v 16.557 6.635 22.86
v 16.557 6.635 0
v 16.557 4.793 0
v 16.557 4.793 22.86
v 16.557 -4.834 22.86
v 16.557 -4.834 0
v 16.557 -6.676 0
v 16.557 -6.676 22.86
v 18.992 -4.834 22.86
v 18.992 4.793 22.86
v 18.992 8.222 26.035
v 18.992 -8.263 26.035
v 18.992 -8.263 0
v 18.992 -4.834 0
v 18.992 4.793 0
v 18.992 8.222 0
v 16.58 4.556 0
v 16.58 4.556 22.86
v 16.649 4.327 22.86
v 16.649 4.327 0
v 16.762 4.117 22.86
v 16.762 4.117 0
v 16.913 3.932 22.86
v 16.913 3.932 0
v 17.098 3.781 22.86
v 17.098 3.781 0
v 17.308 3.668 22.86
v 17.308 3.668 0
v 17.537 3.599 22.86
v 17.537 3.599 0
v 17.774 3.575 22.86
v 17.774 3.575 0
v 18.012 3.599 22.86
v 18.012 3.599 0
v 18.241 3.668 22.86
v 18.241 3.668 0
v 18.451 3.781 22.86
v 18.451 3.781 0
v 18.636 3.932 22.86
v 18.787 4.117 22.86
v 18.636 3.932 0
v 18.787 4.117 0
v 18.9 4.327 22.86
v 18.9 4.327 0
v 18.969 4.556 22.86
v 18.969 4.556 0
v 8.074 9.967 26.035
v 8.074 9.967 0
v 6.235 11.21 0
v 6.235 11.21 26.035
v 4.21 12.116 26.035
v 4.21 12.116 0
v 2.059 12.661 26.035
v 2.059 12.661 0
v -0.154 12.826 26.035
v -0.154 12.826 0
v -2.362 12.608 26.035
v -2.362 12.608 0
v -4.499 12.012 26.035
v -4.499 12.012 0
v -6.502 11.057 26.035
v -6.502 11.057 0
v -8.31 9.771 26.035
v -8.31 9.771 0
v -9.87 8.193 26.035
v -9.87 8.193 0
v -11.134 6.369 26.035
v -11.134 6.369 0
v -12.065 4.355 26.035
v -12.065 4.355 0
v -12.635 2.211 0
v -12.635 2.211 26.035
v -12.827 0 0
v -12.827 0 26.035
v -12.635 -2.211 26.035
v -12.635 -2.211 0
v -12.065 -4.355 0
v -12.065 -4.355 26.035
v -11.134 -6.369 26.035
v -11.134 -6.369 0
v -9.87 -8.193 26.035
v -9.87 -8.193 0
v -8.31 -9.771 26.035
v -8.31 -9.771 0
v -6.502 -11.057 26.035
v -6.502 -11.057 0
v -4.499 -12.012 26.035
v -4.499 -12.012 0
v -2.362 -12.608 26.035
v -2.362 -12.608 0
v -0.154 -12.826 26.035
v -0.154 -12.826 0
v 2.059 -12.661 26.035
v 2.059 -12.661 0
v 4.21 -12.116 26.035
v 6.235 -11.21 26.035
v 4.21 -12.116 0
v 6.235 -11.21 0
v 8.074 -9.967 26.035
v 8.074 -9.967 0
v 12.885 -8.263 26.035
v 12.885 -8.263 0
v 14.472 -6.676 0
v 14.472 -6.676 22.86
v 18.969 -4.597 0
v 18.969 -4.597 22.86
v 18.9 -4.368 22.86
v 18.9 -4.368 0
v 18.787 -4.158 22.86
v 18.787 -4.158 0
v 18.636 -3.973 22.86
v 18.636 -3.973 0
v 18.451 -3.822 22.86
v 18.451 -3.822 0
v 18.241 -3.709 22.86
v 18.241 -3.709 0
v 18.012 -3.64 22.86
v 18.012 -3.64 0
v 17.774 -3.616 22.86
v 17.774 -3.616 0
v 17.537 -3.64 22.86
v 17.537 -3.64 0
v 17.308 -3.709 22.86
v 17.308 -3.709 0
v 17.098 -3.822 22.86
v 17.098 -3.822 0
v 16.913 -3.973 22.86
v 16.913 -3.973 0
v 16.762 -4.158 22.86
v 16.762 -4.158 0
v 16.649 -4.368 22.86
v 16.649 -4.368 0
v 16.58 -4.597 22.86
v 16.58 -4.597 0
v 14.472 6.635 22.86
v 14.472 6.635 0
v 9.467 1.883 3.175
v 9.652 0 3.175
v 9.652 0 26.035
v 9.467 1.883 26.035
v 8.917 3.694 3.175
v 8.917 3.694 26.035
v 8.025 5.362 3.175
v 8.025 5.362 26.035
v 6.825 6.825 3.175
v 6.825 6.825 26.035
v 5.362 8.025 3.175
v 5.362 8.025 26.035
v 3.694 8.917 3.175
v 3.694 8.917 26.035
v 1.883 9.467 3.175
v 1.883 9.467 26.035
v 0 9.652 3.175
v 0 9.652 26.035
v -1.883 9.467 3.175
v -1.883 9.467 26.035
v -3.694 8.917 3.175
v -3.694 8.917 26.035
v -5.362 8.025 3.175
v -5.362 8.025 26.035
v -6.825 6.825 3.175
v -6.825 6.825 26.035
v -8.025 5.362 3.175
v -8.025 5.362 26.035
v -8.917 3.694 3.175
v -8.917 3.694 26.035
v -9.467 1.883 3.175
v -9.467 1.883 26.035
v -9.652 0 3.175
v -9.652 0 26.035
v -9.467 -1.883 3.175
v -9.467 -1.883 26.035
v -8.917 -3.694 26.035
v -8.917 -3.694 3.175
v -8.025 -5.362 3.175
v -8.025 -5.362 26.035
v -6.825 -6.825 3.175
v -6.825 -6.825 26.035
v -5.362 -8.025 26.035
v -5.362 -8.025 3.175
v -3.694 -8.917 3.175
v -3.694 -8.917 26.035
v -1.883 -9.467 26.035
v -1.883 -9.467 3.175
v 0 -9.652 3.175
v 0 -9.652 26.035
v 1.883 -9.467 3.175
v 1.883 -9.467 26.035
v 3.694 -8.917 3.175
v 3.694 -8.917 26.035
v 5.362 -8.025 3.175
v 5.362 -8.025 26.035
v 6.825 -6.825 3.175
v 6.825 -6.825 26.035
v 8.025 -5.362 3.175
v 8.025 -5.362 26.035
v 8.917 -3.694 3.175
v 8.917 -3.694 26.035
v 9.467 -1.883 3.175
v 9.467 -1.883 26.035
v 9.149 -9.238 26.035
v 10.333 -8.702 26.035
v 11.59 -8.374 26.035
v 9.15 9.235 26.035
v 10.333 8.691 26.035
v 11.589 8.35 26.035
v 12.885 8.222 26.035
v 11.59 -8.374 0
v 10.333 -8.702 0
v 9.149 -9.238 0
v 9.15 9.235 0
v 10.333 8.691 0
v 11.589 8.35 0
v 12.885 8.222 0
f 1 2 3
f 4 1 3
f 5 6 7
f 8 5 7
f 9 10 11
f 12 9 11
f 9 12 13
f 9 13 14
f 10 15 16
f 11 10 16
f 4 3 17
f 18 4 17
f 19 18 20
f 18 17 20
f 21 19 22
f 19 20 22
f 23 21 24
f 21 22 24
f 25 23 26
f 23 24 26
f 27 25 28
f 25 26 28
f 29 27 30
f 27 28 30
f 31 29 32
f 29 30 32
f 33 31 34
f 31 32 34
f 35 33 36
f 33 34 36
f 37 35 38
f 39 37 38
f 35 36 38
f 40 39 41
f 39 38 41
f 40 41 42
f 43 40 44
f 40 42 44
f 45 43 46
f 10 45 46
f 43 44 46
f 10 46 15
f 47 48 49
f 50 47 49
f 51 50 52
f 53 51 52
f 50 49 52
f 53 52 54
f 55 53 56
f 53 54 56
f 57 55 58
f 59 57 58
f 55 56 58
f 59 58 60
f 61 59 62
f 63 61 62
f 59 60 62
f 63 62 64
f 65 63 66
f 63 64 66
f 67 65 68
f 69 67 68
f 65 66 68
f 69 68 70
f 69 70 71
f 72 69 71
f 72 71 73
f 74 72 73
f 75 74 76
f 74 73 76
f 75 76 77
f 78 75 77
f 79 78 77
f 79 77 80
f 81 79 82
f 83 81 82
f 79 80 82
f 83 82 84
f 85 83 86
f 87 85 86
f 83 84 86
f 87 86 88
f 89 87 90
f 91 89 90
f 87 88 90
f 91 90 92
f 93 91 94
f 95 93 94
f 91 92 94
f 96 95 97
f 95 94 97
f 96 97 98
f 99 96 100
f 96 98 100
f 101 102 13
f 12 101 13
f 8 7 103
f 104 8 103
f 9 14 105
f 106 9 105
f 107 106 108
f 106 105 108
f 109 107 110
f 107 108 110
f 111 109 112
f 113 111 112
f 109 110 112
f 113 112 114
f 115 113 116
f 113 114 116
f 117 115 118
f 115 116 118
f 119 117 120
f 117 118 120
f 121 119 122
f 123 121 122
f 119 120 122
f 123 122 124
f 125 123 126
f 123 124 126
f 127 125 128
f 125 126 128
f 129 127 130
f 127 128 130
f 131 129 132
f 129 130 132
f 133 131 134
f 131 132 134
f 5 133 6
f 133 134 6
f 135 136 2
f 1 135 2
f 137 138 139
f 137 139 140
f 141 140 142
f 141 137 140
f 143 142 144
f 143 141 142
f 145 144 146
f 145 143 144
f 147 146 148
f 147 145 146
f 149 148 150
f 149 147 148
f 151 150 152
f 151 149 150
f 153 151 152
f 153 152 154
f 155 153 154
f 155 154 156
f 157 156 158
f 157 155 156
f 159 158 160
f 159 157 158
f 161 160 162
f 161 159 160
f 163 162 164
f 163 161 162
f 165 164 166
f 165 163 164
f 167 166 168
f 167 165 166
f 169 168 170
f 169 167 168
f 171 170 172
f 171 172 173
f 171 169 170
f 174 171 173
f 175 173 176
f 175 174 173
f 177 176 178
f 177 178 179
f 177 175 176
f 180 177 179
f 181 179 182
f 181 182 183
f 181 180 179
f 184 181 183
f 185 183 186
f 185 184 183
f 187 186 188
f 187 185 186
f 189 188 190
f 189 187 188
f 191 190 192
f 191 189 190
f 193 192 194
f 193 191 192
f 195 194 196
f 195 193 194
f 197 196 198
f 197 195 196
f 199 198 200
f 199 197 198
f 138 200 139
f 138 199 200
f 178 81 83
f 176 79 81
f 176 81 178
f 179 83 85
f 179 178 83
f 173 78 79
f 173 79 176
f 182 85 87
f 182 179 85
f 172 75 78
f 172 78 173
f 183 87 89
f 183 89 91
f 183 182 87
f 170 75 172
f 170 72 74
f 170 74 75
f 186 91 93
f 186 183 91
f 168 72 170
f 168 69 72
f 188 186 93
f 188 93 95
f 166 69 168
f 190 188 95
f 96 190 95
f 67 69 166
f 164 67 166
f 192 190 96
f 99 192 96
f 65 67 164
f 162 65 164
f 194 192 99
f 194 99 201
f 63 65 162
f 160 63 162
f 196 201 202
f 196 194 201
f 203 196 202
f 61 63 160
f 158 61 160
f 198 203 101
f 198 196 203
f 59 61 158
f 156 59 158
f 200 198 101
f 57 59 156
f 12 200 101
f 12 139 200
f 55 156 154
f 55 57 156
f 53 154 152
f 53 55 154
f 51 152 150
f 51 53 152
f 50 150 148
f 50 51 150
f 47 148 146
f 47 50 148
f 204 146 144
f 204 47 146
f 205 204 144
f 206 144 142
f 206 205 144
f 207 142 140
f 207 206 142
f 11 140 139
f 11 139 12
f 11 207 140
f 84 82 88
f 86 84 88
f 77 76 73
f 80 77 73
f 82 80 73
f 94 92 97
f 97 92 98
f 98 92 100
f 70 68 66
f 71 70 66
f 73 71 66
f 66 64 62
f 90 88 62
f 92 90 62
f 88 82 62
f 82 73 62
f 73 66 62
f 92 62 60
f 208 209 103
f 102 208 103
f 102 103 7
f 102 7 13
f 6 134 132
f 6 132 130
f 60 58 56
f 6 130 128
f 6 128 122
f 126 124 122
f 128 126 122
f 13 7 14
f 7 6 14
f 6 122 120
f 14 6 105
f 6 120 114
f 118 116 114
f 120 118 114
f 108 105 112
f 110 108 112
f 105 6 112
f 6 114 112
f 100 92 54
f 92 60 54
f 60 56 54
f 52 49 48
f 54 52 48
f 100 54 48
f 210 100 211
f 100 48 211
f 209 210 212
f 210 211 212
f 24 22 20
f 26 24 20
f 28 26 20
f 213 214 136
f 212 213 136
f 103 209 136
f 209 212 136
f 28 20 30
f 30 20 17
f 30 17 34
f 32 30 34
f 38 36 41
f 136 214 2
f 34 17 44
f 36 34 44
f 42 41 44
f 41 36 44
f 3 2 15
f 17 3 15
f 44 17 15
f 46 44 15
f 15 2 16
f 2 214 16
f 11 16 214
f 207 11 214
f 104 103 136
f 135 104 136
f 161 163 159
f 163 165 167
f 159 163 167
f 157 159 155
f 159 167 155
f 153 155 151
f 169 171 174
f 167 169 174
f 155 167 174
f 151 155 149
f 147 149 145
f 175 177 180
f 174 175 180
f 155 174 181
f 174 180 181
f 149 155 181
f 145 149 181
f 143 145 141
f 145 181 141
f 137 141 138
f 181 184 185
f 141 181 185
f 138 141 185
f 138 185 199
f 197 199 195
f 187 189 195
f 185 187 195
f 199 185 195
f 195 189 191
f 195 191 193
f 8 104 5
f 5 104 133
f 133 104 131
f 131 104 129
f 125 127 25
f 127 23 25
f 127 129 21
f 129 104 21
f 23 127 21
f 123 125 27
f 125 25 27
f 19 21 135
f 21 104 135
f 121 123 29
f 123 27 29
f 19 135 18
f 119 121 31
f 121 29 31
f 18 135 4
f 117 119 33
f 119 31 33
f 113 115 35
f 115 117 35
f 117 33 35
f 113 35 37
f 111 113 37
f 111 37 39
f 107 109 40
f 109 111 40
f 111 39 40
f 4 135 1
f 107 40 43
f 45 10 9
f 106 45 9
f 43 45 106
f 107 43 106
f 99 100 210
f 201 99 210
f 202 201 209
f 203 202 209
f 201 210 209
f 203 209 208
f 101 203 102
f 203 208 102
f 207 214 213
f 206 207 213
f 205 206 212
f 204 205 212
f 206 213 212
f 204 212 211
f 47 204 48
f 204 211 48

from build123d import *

# Parameters (mm, degrees)
F0_R     = 9.652
F1_DEPTH = 22.86
F2_R     = 9.652
F3_DEPTH = 3.175
F4_R     = 9.652
F5_DEPTH = 3.175


with BuildPart() as f1:
    # F0 (on Top) → F1 (new body)
    with BuildSketch(Plane.XY):
        with BuildLine():
            Line((14.4724995292, -6.4216016291), (14.4724995292, 6.2783983709))
            Line((14.4724995292, 6.2783983709), (14.4724995292, 6.6347159585))
            Line((14.4724995292, 6.6347159585), (14.5994995292, 6.6347159585))
            Line((14.5994995292, 6.6347159585), (16.1869995292, 6.6347159585))
            Line((16.1869995292, 6.6347159585), (16.5567258399, 6.6347159585))
            Line((16.5567258399, 6.6347159585), (16.5567258399, 4.7932159585))
            ThreePointArc((16.5567258399, 4.7932159585), (17.7744995292, 3.5754422692), (18.9922732184, 4.7932159585))
            Line((18.9922732184, 4.7932159585), (18.9922732184, 6.6347159585))
            Line((18.9922732184, 6.6347159585), (18.9922732184, 8.2222159585))
            Line((18.9922732184, 8.2222159585), (14.4724995292, 8.2222159585))
            Line((14.4724995292, 8.2222159585), (12.8849995292, 8.2222159585))
            ThreePointArc((12.8849995292, 8.2222159585), (10.3328098948, 8.6905993264), (8.0737784074, 9.9672479265))
            ThreePointArc((8.0737784074, 9.9672479265), (-12.827, 0), (8.0737784074, -9.9672479265))
            ThreePointArc((8.0737784074, -9.9672479265), (10.3329433344, -8.7017229937), (12.8849995292, -8.2631016291))
            Line((12.8849995292, -8.2631016291), (14.4724995292, -8.2631016291))
            Line((14.4724995292, -8.2631016291), (18.9922732184, -8.2631016291))
            Line((18.9922732184, -8.2631016291), (18.9922732184, -6.6756016291))
            Line((18.9922732184, -6.6756016291), (18.9922732184, -4.8341016291))
            ThreePointArc((18.9922732184, -4.8341016291), (17.7744995292, -3.6163279398), (16.5567258399, -4.8341016291))
            Line((16.5567258399, -4.8341016291), (16.5567258399, -6.6756016291))
            Line((16.5567258399, -6.6756016291), (16.1869995292, -6.6756016291))
            Line((16.1869995292, -6.6756016291), (14.4724995292, -6.6756016291))
            Line((14.4724995292, -6.6756016291), (14.4724995292, -6.4216016291))
        make_face()
        Circle(F0_R, mode=Mode.SUBTRACT)
    extrude(amount=F1_DEPTH)

    # F2 (on face) → F3 (join)
    with BuildSketch(Plane.XY.offset(22.86)):
        with BuildLine():
            ThreePointArc((12.8849995292, 8.2222159585), (10.3328098948, 8.6905993264), (8.0737784074, 9.9672479265))
            ThreePointArc((8.0737784074, 9.9672479265), (-12.827, 0), (8.0737784074, -9.9672479265))
            ThreePointArc((8.0737784074, -9.9672479265), (10.3329433344, -8.7017229937), (12.8849995292, -8.2631016291))
            Line((12.8849995292, -8.2631016291), (18.9922732184, -8.2631016291))
            Line((18.9922732184, -8.2631016291), (18.9922732184, -4.8341016291))
            ThreePointArc((18.9922732184, -4.8341016291), (17.7744995292, -3.6163279398), (16.5567258399, -4.8341016291))
            Line((16.5567258399, -4.8341016291), (16.5567258399, -6.6756016291))
            Line((16.5567258399, -6.6756016291), (14.4724995292, -6.6756016291))
            Line((14.4724995292, -6.6756016291), (14.4724995292, 6.6347159585))
            Line((14.4724995292, 6.6347159585), (16.5567258399, 6.6347159585))
            Line((16.5567258399, 6.6347159585), (16.5567258399, 4.7932159585))
            ThreePointArc((16.5567258399, 4.7932159585), (17.7744995292, 3.5754422692), (18.9922732184, 4.7932159585))
            Line((18.9922732184, 4.7932159585), (18.9922732184, 8.2222159585))
            Line((18.9922732184, 8.2222159585), (12.8849995292, 8.2222159585))
        make_face()
        Circle(F2_R, mode=Mode.SUBTRACT)
        with BuildLine():
            Line((18.9922732184, -4.8341016291), (18.9922732184, 4.7932159585))
            ThreePointArc((18.9922732184, 4.7932159585), (17.7744995292, 3.5754422692), (16.5567258399, 4.7932159585))
            Line((16.5567258399, 4.7932159585), (16.5567258399, 6.6347159585))
            Line((16.5567258399, 6.6347159585), (14.4724995292, 6.6347159585))
            Line((14.4724995292, 6.6347159585), (14.4724995292, -6.6756016291))
            Line((14.4724995292, -6.6756016291), (16.5567258399, -6.6756016291))
            Line((16.5567258399, -6.6756016291), (16.5567258399, -4.8341016291))
            ThreePointArc((16.5567258399, -4.8341016291), (17.7744995292, -3.6163279398), (18.9922732184, -4.8341016291))
        make_face()
    extrude(amount=F3_DEPTH)

    # F4 (on face) → F5 (join)
    with BuildSketch(Plane(origin=(0, 0, 0), x_dir=(1, 0, 0), z_dir=(0, 0, -1))):
        with BuildLine():
            Line((18.9922732184, 8.2631016291), (12.8849995292, 8.2631016291))
            ThreePointArc((12.8849995292, 8.2631016291), (10.3329433344, 8.7017229937), (8.0737784074, 9.9672479265))
            ThreePointArc((8.0737784074, 9.9672479265), (-12.827, 0), (8.0737784074, -9.9672479265))
            ThreePointArc((8.0737784074, -9.9672479265), (10.3328098948, -8.6905993264), (12.8849995292, -8.2222159585))
            Line((12.8849995292, -8.2222159585), (18.9922732184, -8.2222159585))
            Line((18.9922732184, -8.2222159585), (18.9922732184, -4.7932159585))
            ThreePointArc((18.9922732184, -4.7932159585), (17.7744995292, -3.5754422692), (16.5567258399, -4.7932159585))
            Line((16.5567258399, -4.7932159585), (16.5567258399, -6.6347159585))
            Line((16.5567258399, -6.6347159585), (14.4724995292, -6.6347159585))
            Line((14.4724995292, -6.6347159585), (14.4724995292, 6.6756016291))
            Line((14.4724995292, 6.6756016291), (16.5567258399, 6.6756016291))
            Line((16.5567258399, 6.6756016291), (16.5567258399, 4.8341016291))
            ThreePointArc((16.5567258399, 4.8341016291), (17.7744995292, 3.6163279398), (18.9922732184, 4.8341016291))
            Line((18.9922732184, 4.8341016291), (18.9922732184, 8.2631016291))
        make_face()
        Circle(F4_R, mode=Mode.SUBTRACT)
        Circle(F4_R)
    extrude(amount=-F5_DEPTH)


solid = f1.part
